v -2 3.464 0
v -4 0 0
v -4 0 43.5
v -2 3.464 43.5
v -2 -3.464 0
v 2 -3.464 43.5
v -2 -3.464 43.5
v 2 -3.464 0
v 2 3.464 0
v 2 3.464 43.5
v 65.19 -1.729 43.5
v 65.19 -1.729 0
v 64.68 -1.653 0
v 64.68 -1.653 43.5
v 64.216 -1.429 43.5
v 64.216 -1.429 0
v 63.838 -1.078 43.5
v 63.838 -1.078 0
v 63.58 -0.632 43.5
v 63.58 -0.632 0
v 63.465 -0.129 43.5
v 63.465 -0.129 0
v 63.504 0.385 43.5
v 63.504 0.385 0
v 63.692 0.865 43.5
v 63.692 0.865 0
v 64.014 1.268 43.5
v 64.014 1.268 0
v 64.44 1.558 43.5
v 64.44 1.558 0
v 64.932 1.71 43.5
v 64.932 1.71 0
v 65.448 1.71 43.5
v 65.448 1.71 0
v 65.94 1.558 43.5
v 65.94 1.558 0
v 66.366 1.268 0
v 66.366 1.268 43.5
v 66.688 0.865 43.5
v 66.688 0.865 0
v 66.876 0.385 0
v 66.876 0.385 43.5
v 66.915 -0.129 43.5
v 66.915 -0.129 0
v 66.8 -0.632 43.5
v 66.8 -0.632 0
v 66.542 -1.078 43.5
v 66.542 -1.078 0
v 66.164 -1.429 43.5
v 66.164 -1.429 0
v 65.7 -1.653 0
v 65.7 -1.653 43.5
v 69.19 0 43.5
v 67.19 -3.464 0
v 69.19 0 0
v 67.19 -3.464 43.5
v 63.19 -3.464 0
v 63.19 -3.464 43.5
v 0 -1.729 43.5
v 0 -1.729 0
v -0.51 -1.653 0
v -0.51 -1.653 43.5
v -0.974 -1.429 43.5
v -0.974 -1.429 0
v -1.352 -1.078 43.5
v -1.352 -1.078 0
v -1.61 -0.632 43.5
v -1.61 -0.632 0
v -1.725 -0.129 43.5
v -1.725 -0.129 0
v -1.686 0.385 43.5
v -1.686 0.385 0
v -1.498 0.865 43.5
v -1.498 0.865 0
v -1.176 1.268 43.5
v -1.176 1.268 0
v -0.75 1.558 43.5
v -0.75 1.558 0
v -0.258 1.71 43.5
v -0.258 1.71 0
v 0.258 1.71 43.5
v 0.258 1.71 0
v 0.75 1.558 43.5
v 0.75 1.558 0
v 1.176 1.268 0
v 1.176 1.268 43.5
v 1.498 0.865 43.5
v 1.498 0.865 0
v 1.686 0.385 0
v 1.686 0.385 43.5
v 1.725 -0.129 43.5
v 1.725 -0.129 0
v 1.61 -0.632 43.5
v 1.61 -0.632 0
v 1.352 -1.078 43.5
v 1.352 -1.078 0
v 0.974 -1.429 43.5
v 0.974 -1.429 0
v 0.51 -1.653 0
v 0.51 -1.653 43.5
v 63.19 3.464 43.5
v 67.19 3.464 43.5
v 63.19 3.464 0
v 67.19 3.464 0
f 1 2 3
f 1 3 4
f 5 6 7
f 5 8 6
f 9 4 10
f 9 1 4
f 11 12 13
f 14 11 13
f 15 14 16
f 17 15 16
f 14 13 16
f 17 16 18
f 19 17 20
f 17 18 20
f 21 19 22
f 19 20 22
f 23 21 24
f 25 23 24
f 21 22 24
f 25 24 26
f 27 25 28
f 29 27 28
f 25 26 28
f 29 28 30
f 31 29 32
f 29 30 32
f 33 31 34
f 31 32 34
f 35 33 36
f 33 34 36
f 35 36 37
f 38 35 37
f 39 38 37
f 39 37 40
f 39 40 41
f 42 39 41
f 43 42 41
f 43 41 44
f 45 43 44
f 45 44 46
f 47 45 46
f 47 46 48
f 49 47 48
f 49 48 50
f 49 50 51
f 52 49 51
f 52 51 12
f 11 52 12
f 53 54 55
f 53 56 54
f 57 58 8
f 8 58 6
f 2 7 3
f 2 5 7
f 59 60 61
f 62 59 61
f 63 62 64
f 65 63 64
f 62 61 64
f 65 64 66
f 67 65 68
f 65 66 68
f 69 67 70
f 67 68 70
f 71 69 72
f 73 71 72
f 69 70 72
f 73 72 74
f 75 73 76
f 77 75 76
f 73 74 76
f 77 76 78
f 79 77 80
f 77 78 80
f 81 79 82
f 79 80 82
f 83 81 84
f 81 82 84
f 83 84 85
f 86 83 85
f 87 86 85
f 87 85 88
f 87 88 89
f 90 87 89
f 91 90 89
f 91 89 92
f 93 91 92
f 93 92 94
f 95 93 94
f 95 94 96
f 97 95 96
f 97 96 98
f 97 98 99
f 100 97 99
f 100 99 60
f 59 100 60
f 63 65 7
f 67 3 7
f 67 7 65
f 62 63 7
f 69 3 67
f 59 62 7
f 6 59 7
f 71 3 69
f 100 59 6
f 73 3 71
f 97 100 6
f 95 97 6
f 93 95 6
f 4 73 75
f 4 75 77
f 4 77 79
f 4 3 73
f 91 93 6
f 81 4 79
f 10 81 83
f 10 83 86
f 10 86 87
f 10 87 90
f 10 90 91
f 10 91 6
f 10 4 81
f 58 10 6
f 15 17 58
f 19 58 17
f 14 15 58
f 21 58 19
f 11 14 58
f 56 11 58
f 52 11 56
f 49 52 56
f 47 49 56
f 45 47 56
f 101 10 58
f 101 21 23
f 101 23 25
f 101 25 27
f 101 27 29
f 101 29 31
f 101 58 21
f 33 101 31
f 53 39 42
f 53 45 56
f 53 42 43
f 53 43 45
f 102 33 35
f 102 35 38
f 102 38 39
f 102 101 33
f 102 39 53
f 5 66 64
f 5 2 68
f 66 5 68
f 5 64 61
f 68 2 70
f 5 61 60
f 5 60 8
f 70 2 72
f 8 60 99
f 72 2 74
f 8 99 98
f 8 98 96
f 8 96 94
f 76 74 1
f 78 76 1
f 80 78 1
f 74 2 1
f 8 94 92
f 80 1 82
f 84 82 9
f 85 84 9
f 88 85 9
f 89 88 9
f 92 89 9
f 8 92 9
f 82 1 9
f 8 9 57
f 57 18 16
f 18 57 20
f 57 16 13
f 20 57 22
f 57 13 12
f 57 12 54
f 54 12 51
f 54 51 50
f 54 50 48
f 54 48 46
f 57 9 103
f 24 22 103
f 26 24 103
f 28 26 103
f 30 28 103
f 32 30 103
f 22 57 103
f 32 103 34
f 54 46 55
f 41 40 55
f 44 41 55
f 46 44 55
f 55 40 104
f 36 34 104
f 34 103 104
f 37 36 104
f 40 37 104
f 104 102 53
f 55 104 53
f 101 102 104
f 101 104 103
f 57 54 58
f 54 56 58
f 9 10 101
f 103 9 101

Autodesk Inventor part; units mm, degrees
sketch "Sketch2" plane through (0, 0, 0) normal (0, 0, 1) x (1, 0, 0)
  line L0 (0, 2.8582) -> (0, -2.8582) construction
  line L1 (-5.7775, 0) -> (5.7775, 0) construction
  line L2 (0, 0) -> (4, 0)
  line L3 (4, 0) -> (-4, 0)
  circle A0 centre (0, 0) radius 4
  line L4 (0, 0) -> (-2, 3.4641)
  line L5 (0, 0) -> (4, 0) construction
  line L6 (0, 0) -> (2, 3.4641)
  line L7 (0, 0) -> (4, 0) construction
  line L8 (0, 0) -> (4, 0)
  line L9 (0, 0) -> (2, -3.4641)
  line L10 (0, 0) -> (-2, -3.4641)
  line L11 (-2, 3.4641) -> (2, 3.4641)
  line L12 (2, 3.4641) -> (4, 0)
  line L13 (4, 0) -> (2, -3.4641)
  line L14 (2, -3.4641) -> (-2, -3.4641)
  line L15 (-2, -3.4641) -> (-4, 0)
  line L16 (-4, 0) -> (-2, 3.4641)
  dimension "d3" = 4
  dimension "d2" = 8
  dimension "d1" = 120
  dimension "d0" = 60
extrude "Extrusion1" add sketch "Sketch2" along normal blind 43.5 contours L6 L12 L2 | L10 L15 L3 | L3 L16 L4 | L4 L11 L6 | L2 L13 L9 | L9 L14 L10
sketch "Sketch3" plane through (0, 0, 43.5) normal (0, 0, 1) x (1, 0, 0)
  point P0 (0, 0)
  point P1 (0, 0)
hole "Hole1" at (0, 0, 43.5) direction (0, 0, -1) diameter 3.4587 depth 44 thread size "M4x0.5" class "6H" standard "ISO Metric profile"
sketch "Sketch5" plane through (0, 0, 43.5) normal (0, 0, 1) x (1, 0, 0)
  line L0 (0, 0) -> (65.19, 0)
  line L1 (65.19, 0) -> (69.19, 0)
  line L2 (65.19, 0) -> (65.19, 3.464)
  line L3 (65.19, 3.464) -> (67.19, 3.464)
  line L4 (67.19, 3.464) -> (69.19, 0)
  line L5 (65.19, 3.464) -> (63.19, 3.464)
  line L6 (65.19, 0) -> (61.19, 0)
  line L7 (61.19, 0) -> (63.19, 3.464)
  line L8 (65.19, 0) -> (65.19, -3.464)
  line L9 (65.19, -3.464) -> (67.19, -3.464)
  line L10 (67.19, -3.464) -> (69.19, 0)
  line L11 (65.19, -3.464) -> (63.19, -3.464)
  line L12 (63.19, -3.464) -> (61.19, 0)
  line L13 (2, 3.4641) -> (-2, 3.4641) projected
  line L14 (0, 3.4641) -> (65.19, 3.464)
  line L15 (65.19, -3.464) -> (0, -3.4641)
  line L16 (-2, -3.4641) -> (2, -3.4641) projected
  line L17 (4, 0) -> (2, 3.4641) projected
  line L18 (0, 3.4641) -> (4, 0)
  line L19 (4, 0) -> (0, -3.4641)
  point P0 (2, 3.4641)
  dimension "d21" = 65.19
  dimension "d22" = 4
  dimension "d23" = 3.464
  dimension "d24" = 2
  dimension "d25" = 2
  dimension "d26" = 4
  dimension "d27" = 3.464
  dimension "d28" = 2
  dimension "d29" = 2
extrude "Extrusion2" add sketch "Sketch5" against normal blind 43.5 contours L17 L14 L7 L0 | L0 L12 L15 L19 | L7 L5 L2 L0 | L0 L8 L11 L12 | L2 L3 L4 L1 | L1 L10 L9 L8
sketch "Sketch6" plane through (0, 0, 43.5) normal (0, 0, 1) x (1, 0, 0)
  line L0 (0, 0) -> (65.19, 0)
  dimension "d32" = 65.19
hole "Hole3" at (65.19, 0, 43.5) direction (0, 0, -1) diameter 3.4587 depth 44 thread size "M4x0.5" class "6H" standard "ISO Metric profile"
properties part number "Steunstuk lang" material "S235"
